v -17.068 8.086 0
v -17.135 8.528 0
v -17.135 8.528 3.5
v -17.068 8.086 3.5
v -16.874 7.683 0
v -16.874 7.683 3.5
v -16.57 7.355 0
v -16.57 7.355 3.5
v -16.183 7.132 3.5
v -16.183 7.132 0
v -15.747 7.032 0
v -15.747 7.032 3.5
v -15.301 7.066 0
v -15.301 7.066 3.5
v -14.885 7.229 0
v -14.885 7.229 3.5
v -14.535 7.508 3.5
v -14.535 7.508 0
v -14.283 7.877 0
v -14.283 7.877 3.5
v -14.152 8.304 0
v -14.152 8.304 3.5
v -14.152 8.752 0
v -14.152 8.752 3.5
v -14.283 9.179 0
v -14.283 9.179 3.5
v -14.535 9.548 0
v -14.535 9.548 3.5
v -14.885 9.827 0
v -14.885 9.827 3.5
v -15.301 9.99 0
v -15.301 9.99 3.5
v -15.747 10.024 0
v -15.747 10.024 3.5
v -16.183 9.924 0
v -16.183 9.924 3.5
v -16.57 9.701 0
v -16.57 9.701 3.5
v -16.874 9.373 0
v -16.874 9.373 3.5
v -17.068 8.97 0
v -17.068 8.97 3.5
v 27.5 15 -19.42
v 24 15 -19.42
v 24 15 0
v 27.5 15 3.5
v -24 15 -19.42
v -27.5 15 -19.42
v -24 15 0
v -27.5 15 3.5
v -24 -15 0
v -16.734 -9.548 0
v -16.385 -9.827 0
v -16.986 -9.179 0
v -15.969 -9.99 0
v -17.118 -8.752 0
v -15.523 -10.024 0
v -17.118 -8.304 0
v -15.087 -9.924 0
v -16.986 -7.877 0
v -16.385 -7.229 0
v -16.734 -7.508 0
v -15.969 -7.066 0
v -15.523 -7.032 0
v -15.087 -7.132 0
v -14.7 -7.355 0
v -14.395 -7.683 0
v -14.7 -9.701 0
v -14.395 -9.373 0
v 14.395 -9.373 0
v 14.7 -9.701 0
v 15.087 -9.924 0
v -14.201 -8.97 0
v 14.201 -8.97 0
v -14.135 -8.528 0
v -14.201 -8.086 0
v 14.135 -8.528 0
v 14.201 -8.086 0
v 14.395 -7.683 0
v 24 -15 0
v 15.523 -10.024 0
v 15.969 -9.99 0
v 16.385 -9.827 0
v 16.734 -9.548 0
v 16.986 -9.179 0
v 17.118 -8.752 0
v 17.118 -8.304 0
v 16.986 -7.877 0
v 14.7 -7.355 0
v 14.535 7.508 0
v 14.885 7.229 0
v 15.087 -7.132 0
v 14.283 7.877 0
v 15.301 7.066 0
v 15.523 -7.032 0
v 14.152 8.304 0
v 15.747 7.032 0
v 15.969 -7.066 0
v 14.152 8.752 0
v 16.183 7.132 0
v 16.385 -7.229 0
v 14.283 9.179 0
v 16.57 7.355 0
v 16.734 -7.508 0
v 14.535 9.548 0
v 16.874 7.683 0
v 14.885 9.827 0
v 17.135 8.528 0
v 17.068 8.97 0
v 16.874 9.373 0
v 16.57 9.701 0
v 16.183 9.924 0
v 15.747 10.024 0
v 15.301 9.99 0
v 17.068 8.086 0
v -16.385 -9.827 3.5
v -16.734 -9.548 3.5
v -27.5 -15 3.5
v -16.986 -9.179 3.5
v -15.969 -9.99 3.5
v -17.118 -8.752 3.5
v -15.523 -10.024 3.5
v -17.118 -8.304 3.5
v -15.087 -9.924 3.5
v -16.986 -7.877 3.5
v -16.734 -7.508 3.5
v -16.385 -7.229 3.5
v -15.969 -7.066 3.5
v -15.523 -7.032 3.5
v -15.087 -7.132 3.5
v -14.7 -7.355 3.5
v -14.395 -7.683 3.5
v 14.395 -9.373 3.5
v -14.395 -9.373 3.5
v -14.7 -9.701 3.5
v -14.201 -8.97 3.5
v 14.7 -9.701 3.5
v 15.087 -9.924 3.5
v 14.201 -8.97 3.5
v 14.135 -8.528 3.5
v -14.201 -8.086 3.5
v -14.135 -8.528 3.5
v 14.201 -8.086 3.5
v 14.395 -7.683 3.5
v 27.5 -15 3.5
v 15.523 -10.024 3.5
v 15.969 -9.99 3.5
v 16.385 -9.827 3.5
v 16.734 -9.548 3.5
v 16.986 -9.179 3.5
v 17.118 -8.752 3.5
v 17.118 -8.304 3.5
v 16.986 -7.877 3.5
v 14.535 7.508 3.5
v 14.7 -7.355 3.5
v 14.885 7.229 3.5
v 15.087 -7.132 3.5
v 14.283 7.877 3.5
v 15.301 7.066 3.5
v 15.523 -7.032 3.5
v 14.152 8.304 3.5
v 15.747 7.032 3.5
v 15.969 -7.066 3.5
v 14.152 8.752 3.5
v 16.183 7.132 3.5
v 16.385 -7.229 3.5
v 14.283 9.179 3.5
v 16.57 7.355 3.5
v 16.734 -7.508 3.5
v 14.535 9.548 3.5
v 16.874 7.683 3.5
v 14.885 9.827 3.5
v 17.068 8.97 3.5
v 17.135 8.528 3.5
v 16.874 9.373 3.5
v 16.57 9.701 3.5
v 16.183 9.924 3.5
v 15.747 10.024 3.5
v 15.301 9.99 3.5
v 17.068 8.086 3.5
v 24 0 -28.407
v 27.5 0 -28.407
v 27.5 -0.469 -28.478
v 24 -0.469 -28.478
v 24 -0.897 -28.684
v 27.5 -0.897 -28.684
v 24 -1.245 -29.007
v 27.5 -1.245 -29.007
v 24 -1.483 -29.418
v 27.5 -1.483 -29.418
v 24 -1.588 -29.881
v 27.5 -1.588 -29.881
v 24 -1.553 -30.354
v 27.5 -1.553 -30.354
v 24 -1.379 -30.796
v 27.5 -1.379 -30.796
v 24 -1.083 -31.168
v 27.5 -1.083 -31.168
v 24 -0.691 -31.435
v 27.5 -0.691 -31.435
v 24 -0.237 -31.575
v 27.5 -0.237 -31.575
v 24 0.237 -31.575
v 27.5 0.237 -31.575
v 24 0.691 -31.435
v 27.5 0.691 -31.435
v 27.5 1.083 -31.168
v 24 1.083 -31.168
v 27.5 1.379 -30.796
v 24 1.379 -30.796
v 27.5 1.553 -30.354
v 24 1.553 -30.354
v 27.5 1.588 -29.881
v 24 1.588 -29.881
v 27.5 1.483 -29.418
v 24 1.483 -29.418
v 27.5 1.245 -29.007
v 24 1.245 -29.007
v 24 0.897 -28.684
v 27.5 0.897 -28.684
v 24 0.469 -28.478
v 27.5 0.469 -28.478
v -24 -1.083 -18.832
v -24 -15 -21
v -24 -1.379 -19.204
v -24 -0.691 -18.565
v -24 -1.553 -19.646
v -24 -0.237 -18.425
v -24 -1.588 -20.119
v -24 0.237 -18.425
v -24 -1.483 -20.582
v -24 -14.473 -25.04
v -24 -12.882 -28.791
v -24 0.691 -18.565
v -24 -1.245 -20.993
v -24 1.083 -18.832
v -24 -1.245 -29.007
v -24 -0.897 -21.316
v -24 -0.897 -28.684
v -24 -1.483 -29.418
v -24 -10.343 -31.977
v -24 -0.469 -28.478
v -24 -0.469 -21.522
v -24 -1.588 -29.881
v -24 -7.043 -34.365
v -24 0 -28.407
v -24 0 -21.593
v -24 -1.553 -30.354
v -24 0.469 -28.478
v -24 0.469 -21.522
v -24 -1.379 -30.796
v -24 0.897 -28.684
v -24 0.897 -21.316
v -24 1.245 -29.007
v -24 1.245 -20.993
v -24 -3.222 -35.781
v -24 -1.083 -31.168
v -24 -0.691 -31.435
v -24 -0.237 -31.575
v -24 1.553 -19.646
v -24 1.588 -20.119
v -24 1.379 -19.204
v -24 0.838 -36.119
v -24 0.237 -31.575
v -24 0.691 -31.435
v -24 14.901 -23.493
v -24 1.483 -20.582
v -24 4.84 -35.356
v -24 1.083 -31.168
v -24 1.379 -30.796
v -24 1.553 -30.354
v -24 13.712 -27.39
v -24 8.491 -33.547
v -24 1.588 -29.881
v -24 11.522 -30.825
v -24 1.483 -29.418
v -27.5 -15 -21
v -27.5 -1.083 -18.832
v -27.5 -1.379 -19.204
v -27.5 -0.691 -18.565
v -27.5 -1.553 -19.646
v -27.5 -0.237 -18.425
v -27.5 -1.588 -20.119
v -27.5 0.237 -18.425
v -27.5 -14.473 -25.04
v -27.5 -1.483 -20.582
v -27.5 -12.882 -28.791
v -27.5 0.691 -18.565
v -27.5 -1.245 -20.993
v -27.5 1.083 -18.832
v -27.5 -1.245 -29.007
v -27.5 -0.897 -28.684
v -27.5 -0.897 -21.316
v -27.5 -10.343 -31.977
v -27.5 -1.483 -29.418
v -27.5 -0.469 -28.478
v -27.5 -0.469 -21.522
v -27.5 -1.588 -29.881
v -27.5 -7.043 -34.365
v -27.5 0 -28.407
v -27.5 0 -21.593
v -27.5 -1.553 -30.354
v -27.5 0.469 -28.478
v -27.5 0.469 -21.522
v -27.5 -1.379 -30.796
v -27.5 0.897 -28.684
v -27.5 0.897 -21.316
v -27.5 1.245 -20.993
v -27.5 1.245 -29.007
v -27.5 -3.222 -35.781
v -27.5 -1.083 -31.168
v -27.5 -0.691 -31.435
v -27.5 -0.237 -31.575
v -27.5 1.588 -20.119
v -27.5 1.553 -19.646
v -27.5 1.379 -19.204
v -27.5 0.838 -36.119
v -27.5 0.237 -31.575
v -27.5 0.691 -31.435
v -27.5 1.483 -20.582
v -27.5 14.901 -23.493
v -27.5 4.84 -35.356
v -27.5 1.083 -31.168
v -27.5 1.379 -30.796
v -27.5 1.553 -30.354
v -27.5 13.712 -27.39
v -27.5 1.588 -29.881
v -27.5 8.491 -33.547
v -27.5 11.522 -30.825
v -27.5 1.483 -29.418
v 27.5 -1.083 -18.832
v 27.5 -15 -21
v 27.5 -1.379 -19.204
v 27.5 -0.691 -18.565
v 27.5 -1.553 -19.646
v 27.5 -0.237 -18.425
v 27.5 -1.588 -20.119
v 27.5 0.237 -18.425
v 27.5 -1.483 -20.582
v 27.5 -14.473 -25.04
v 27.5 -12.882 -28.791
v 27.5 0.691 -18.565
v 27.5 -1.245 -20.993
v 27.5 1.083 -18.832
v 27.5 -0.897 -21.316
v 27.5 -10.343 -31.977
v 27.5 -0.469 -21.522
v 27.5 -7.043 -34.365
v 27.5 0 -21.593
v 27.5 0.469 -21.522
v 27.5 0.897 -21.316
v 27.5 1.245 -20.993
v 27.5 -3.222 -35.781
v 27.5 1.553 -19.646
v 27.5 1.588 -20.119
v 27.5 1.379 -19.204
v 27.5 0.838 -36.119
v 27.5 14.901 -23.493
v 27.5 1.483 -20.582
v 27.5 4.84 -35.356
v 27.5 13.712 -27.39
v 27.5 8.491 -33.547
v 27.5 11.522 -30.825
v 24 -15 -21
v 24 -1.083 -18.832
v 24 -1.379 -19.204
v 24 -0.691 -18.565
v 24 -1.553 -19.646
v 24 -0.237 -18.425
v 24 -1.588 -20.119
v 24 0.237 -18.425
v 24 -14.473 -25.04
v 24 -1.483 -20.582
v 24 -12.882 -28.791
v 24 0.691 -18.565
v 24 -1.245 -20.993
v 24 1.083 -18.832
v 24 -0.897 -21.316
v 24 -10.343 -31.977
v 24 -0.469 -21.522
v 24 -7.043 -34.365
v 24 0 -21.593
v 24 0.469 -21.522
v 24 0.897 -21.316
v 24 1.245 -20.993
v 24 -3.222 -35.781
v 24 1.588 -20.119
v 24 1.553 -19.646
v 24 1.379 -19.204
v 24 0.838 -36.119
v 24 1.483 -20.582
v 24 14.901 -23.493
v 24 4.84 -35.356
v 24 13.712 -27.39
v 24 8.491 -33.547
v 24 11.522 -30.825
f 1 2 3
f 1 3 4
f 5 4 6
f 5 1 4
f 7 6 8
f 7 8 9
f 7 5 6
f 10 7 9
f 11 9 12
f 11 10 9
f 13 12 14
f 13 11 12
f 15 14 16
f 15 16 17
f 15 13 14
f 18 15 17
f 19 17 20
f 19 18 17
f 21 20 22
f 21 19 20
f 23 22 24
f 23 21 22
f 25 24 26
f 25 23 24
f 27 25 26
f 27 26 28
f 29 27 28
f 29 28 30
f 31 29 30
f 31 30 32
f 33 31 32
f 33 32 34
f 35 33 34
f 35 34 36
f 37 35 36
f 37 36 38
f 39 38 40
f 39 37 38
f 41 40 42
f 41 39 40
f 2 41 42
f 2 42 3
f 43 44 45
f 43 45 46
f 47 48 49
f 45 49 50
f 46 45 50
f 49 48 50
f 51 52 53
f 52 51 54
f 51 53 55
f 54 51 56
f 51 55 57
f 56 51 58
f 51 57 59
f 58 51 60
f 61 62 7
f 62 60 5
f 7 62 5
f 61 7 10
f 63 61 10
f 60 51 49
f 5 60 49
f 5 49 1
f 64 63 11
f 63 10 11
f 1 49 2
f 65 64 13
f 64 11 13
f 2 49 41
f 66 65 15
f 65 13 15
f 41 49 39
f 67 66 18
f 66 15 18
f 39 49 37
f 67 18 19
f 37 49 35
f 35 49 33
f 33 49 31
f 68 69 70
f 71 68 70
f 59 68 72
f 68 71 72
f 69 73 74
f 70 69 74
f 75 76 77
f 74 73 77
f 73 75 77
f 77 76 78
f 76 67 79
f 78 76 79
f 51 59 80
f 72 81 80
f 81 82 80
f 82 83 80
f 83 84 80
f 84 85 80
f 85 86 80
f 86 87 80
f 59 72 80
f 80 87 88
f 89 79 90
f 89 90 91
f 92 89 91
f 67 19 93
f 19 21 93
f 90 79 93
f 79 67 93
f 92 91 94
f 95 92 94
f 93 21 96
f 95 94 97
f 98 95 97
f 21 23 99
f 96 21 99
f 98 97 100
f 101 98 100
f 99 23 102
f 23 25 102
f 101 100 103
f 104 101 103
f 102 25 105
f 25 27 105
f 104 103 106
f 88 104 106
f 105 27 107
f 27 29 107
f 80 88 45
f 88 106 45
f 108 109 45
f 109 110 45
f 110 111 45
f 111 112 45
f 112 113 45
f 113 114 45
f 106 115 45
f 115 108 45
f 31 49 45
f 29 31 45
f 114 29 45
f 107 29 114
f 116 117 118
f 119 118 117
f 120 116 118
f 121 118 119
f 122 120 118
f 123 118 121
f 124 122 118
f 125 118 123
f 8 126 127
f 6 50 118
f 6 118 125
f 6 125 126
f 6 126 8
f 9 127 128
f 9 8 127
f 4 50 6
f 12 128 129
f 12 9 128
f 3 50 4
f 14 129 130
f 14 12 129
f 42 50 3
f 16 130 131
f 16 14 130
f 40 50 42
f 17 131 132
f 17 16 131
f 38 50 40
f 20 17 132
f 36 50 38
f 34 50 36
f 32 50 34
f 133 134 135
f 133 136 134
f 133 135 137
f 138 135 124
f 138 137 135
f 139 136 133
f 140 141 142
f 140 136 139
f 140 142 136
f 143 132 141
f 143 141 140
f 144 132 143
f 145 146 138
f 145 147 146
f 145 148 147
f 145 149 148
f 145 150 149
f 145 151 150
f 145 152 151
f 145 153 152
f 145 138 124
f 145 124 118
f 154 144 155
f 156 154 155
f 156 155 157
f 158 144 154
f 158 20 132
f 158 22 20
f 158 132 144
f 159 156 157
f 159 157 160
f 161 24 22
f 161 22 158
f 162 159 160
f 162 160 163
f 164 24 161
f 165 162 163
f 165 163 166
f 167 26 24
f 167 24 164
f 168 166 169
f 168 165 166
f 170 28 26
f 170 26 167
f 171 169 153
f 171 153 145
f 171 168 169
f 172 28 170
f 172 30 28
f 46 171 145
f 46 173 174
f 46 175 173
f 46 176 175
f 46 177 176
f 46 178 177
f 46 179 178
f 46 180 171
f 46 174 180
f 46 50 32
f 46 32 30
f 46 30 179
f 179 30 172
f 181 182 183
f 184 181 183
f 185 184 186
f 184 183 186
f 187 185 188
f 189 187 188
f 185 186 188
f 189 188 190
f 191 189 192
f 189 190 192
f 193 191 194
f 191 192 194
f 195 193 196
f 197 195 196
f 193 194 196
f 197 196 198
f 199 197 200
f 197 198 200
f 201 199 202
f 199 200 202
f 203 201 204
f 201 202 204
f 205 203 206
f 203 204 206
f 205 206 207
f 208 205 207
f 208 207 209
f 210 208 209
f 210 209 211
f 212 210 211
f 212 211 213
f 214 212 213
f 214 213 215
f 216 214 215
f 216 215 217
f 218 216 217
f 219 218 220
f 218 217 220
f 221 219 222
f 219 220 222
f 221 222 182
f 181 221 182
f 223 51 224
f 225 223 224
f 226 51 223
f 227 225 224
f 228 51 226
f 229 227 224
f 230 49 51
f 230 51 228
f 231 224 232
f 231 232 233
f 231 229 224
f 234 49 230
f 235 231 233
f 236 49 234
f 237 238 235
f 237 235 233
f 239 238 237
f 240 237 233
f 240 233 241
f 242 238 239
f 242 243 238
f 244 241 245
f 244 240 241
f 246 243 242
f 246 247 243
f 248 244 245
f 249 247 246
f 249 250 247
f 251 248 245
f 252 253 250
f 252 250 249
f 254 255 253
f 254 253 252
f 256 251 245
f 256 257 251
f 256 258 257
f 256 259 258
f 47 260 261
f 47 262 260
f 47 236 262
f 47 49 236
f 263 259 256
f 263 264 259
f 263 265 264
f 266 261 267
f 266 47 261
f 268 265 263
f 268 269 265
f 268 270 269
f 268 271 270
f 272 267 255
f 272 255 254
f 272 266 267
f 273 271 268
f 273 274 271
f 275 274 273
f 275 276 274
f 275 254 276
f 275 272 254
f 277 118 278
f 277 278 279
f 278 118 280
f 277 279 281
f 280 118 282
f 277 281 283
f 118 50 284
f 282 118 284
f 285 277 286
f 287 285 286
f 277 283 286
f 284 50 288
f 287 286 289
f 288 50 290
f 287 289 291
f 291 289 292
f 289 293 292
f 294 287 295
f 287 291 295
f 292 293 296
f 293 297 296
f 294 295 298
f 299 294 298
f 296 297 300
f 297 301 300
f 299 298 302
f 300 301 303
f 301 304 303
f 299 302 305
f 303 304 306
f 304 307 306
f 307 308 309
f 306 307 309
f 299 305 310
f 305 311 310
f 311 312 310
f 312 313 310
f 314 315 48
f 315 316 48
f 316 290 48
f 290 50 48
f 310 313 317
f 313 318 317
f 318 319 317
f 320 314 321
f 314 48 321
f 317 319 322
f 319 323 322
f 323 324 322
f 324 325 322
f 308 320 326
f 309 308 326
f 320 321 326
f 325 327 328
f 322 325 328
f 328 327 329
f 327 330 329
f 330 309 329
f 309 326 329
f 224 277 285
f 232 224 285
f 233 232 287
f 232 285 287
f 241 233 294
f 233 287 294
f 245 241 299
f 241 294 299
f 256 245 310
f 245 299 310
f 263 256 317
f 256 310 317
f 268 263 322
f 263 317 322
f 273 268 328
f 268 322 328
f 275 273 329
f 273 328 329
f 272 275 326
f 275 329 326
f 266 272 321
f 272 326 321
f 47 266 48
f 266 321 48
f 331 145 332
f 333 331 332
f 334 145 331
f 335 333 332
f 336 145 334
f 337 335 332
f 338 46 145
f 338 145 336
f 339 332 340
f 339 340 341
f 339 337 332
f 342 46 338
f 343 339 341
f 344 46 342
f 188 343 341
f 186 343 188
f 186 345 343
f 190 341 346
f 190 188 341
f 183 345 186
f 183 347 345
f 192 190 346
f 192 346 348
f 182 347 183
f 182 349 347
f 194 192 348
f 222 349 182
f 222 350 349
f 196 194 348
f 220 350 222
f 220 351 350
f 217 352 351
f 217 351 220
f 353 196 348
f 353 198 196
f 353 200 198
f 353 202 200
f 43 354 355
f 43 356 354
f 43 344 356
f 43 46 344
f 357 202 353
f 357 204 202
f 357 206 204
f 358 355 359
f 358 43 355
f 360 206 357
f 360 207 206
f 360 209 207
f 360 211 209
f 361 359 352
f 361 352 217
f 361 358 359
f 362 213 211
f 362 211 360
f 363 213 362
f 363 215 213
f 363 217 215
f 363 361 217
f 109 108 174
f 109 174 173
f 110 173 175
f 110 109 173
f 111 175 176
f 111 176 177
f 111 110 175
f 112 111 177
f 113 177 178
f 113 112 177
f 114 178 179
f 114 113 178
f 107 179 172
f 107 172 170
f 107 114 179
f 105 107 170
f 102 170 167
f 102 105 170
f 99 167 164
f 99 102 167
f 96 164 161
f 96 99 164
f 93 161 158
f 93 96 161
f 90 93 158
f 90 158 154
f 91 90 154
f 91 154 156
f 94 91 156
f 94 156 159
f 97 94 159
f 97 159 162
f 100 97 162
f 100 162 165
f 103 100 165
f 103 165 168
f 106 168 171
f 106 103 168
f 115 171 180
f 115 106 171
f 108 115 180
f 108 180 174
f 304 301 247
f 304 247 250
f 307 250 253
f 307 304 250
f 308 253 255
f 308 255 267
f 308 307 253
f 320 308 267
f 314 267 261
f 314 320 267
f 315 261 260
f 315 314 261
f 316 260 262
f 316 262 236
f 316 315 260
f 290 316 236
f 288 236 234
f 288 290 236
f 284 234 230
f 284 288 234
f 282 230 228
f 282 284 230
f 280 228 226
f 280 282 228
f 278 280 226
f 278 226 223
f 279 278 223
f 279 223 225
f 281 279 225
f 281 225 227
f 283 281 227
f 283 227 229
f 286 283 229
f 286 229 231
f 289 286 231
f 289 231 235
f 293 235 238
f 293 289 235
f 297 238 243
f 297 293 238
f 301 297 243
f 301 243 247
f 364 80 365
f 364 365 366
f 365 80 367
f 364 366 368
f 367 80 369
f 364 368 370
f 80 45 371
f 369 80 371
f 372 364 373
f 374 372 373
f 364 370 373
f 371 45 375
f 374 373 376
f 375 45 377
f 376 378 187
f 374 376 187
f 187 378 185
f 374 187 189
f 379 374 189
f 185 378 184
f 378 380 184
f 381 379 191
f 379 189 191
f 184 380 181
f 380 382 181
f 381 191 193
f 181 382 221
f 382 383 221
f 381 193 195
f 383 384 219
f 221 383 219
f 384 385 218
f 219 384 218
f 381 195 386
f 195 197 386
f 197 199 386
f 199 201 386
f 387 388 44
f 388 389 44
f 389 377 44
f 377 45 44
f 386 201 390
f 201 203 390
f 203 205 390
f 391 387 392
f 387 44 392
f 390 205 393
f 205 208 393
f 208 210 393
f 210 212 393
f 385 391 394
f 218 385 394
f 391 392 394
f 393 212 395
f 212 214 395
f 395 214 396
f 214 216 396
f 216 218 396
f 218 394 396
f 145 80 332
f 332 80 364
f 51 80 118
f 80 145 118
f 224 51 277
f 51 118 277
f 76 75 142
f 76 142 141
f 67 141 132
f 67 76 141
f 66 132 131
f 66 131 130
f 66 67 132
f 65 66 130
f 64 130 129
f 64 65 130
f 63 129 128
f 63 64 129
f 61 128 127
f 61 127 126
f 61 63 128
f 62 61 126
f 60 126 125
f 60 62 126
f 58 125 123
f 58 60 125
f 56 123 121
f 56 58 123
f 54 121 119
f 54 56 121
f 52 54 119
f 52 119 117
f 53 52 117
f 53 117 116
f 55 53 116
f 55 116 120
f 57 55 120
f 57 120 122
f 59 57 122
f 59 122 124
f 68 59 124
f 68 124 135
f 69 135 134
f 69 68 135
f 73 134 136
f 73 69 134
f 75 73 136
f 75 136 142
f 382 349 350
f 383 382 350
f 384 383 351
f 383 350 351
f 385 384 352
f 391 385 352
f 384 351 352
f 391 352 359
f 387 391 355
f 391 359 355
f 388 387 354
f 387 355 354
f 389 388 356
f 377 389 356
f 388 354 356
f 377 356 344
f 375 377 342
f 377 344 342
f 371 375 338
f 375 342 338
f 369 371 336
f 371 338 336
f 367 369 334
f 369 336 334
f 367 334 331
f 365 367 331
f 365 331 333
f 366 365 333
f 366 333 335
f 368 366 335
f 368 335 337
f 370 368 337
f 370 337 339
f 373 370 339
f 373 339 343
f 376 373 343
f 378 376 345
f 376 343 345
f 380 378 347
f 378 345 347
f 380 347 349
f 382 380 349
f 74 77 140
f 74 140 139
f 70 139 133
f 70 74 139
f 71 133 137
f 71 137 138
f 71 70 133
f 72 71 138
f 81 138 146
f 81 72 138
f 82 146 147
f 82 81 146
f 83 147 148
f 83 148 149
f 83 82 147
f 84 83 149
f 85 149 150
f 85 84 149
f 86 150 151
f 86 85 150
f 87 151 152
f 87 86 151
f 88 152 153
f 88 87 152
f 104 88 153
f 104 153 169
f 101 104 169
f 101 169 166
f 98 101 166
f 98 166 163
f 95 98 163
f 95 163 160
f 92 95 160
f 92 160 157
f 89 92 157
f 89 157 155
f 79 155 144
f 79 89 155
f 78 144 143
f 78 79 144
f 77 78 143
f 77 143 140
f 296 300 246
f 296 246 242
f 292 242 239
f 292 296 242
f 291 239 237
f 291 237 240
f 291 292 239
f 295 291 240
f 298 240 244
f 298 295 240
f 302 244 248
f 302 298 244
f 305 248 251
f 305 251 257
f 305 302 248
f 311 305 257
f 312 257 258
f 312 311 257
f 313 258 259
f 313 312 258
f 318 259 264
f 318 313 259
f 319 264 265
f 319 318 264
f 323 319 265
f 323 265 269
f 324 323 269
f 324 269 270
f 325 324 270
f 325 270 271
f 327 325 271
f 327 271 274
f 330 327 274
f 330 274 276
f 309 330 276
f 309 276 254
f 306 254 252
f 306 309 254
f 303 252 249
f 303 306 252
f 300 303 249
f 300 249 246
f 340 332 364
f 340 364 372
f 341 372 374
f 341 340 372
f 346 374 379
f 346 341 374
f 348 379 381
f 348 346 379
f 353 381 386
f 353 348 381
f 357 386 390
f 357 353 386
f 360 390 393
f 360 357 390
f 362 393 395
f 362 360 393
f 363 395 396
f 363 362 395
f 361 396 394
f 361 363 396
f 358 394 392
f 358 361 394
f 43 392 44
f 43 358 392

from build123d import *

# Parameters (mm, degrees)
SKETCH_1_W      = 55
SKETCH_1_H      = 30
SKETCH_1_R      = 1.5
EXTRUDE_1_DEPTH = 3.5
SKETCH_2_R      = 1.592723526
EXTRUDE_2_DEPTH = 3.5


with BuildPart() as part:
    # 草图1 → 凸台-拉伸1 (new body)
    with BuildSketch(Plane.XY):
        Rectangle(SKETCH_1_W, SKETCH_1_H)
        with Locations((15.634746474, 8.528043531)):
            Circle(SKETCH_1_R, mode=Mode.SUBTRACT)
        with Locations(Location((-15.634746474, 8.528043531, 0), (0, 0, 180))):
            Circle(SKETCH_1_R, mode=Mode.SUBTRACT)
        with Locations(Location((15.634746474, -8.528043531, 0), (0, 0, 180))):
            Circle(SKETCH_1_R, mode=Mode.SUBTRACT)
        with Locations((-15.634746474, -8.528043531)):
            Circle(SKETCH_1_R, mode=Mode.SUBTRACT)
    extrude(amount=EXTRUDE_1_DEPTH)

    # 草图2 → 凸台-拉伸2 (add)
    with BuildSketch(Plane(origin=(27.5, 0, 0), x_dir=(0, 0, -1), z_dir=(1, 0, 0))):
        with BuildLine():
            Line((0, 15), (0, -15))
            Line((0, -15), (21, -15))
            ThreePointArc((21, -15), (36.119015722, 0.838004237), (19.419767517, 15))
            Line((19.419767517, 15), (0, 15))
        make_face()
        with Locations((20, 0)):
            Circle(SKETCH_2_R, mode=Mode.SUBTRACT)
        with Locations(Location((30, 0, 0), (0, 0, 180))):
            Circle(SKETCH_2_R, mode=Mode.SUBTRACT)
    extrude_2 = extrude(amount=-EXTRUDE_2_DEPTH)

    # 镜向1: 凸台-拉伸2 across plane
    add(extrude_2.mirror(Plane(origin=(0, 0, 0), x_dir=(0, 0, 1), z_dir=(1, 0, 0))))


solid = part.part
